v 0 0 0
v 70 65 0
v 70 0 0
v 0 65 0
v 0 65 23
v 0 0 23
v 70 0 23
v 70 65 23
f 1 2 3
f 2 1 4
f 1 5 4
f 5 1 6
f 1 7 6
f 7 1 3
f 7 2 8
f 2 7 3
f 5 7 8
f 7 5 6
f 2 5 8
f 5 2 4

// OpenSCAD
// fake nodemcu
module nodemcu() {
color("gray", 0.5)
cube([57, 30, 13]);
}

//fake battery
module battery() {
color("gray", 0.5)
    cube([70, 65, 23]);
}

module bmp280() {
    color("purple", 0.5)
    cube([14, 10, 5]);
}

nodemcu();
battery();
bmp280();
